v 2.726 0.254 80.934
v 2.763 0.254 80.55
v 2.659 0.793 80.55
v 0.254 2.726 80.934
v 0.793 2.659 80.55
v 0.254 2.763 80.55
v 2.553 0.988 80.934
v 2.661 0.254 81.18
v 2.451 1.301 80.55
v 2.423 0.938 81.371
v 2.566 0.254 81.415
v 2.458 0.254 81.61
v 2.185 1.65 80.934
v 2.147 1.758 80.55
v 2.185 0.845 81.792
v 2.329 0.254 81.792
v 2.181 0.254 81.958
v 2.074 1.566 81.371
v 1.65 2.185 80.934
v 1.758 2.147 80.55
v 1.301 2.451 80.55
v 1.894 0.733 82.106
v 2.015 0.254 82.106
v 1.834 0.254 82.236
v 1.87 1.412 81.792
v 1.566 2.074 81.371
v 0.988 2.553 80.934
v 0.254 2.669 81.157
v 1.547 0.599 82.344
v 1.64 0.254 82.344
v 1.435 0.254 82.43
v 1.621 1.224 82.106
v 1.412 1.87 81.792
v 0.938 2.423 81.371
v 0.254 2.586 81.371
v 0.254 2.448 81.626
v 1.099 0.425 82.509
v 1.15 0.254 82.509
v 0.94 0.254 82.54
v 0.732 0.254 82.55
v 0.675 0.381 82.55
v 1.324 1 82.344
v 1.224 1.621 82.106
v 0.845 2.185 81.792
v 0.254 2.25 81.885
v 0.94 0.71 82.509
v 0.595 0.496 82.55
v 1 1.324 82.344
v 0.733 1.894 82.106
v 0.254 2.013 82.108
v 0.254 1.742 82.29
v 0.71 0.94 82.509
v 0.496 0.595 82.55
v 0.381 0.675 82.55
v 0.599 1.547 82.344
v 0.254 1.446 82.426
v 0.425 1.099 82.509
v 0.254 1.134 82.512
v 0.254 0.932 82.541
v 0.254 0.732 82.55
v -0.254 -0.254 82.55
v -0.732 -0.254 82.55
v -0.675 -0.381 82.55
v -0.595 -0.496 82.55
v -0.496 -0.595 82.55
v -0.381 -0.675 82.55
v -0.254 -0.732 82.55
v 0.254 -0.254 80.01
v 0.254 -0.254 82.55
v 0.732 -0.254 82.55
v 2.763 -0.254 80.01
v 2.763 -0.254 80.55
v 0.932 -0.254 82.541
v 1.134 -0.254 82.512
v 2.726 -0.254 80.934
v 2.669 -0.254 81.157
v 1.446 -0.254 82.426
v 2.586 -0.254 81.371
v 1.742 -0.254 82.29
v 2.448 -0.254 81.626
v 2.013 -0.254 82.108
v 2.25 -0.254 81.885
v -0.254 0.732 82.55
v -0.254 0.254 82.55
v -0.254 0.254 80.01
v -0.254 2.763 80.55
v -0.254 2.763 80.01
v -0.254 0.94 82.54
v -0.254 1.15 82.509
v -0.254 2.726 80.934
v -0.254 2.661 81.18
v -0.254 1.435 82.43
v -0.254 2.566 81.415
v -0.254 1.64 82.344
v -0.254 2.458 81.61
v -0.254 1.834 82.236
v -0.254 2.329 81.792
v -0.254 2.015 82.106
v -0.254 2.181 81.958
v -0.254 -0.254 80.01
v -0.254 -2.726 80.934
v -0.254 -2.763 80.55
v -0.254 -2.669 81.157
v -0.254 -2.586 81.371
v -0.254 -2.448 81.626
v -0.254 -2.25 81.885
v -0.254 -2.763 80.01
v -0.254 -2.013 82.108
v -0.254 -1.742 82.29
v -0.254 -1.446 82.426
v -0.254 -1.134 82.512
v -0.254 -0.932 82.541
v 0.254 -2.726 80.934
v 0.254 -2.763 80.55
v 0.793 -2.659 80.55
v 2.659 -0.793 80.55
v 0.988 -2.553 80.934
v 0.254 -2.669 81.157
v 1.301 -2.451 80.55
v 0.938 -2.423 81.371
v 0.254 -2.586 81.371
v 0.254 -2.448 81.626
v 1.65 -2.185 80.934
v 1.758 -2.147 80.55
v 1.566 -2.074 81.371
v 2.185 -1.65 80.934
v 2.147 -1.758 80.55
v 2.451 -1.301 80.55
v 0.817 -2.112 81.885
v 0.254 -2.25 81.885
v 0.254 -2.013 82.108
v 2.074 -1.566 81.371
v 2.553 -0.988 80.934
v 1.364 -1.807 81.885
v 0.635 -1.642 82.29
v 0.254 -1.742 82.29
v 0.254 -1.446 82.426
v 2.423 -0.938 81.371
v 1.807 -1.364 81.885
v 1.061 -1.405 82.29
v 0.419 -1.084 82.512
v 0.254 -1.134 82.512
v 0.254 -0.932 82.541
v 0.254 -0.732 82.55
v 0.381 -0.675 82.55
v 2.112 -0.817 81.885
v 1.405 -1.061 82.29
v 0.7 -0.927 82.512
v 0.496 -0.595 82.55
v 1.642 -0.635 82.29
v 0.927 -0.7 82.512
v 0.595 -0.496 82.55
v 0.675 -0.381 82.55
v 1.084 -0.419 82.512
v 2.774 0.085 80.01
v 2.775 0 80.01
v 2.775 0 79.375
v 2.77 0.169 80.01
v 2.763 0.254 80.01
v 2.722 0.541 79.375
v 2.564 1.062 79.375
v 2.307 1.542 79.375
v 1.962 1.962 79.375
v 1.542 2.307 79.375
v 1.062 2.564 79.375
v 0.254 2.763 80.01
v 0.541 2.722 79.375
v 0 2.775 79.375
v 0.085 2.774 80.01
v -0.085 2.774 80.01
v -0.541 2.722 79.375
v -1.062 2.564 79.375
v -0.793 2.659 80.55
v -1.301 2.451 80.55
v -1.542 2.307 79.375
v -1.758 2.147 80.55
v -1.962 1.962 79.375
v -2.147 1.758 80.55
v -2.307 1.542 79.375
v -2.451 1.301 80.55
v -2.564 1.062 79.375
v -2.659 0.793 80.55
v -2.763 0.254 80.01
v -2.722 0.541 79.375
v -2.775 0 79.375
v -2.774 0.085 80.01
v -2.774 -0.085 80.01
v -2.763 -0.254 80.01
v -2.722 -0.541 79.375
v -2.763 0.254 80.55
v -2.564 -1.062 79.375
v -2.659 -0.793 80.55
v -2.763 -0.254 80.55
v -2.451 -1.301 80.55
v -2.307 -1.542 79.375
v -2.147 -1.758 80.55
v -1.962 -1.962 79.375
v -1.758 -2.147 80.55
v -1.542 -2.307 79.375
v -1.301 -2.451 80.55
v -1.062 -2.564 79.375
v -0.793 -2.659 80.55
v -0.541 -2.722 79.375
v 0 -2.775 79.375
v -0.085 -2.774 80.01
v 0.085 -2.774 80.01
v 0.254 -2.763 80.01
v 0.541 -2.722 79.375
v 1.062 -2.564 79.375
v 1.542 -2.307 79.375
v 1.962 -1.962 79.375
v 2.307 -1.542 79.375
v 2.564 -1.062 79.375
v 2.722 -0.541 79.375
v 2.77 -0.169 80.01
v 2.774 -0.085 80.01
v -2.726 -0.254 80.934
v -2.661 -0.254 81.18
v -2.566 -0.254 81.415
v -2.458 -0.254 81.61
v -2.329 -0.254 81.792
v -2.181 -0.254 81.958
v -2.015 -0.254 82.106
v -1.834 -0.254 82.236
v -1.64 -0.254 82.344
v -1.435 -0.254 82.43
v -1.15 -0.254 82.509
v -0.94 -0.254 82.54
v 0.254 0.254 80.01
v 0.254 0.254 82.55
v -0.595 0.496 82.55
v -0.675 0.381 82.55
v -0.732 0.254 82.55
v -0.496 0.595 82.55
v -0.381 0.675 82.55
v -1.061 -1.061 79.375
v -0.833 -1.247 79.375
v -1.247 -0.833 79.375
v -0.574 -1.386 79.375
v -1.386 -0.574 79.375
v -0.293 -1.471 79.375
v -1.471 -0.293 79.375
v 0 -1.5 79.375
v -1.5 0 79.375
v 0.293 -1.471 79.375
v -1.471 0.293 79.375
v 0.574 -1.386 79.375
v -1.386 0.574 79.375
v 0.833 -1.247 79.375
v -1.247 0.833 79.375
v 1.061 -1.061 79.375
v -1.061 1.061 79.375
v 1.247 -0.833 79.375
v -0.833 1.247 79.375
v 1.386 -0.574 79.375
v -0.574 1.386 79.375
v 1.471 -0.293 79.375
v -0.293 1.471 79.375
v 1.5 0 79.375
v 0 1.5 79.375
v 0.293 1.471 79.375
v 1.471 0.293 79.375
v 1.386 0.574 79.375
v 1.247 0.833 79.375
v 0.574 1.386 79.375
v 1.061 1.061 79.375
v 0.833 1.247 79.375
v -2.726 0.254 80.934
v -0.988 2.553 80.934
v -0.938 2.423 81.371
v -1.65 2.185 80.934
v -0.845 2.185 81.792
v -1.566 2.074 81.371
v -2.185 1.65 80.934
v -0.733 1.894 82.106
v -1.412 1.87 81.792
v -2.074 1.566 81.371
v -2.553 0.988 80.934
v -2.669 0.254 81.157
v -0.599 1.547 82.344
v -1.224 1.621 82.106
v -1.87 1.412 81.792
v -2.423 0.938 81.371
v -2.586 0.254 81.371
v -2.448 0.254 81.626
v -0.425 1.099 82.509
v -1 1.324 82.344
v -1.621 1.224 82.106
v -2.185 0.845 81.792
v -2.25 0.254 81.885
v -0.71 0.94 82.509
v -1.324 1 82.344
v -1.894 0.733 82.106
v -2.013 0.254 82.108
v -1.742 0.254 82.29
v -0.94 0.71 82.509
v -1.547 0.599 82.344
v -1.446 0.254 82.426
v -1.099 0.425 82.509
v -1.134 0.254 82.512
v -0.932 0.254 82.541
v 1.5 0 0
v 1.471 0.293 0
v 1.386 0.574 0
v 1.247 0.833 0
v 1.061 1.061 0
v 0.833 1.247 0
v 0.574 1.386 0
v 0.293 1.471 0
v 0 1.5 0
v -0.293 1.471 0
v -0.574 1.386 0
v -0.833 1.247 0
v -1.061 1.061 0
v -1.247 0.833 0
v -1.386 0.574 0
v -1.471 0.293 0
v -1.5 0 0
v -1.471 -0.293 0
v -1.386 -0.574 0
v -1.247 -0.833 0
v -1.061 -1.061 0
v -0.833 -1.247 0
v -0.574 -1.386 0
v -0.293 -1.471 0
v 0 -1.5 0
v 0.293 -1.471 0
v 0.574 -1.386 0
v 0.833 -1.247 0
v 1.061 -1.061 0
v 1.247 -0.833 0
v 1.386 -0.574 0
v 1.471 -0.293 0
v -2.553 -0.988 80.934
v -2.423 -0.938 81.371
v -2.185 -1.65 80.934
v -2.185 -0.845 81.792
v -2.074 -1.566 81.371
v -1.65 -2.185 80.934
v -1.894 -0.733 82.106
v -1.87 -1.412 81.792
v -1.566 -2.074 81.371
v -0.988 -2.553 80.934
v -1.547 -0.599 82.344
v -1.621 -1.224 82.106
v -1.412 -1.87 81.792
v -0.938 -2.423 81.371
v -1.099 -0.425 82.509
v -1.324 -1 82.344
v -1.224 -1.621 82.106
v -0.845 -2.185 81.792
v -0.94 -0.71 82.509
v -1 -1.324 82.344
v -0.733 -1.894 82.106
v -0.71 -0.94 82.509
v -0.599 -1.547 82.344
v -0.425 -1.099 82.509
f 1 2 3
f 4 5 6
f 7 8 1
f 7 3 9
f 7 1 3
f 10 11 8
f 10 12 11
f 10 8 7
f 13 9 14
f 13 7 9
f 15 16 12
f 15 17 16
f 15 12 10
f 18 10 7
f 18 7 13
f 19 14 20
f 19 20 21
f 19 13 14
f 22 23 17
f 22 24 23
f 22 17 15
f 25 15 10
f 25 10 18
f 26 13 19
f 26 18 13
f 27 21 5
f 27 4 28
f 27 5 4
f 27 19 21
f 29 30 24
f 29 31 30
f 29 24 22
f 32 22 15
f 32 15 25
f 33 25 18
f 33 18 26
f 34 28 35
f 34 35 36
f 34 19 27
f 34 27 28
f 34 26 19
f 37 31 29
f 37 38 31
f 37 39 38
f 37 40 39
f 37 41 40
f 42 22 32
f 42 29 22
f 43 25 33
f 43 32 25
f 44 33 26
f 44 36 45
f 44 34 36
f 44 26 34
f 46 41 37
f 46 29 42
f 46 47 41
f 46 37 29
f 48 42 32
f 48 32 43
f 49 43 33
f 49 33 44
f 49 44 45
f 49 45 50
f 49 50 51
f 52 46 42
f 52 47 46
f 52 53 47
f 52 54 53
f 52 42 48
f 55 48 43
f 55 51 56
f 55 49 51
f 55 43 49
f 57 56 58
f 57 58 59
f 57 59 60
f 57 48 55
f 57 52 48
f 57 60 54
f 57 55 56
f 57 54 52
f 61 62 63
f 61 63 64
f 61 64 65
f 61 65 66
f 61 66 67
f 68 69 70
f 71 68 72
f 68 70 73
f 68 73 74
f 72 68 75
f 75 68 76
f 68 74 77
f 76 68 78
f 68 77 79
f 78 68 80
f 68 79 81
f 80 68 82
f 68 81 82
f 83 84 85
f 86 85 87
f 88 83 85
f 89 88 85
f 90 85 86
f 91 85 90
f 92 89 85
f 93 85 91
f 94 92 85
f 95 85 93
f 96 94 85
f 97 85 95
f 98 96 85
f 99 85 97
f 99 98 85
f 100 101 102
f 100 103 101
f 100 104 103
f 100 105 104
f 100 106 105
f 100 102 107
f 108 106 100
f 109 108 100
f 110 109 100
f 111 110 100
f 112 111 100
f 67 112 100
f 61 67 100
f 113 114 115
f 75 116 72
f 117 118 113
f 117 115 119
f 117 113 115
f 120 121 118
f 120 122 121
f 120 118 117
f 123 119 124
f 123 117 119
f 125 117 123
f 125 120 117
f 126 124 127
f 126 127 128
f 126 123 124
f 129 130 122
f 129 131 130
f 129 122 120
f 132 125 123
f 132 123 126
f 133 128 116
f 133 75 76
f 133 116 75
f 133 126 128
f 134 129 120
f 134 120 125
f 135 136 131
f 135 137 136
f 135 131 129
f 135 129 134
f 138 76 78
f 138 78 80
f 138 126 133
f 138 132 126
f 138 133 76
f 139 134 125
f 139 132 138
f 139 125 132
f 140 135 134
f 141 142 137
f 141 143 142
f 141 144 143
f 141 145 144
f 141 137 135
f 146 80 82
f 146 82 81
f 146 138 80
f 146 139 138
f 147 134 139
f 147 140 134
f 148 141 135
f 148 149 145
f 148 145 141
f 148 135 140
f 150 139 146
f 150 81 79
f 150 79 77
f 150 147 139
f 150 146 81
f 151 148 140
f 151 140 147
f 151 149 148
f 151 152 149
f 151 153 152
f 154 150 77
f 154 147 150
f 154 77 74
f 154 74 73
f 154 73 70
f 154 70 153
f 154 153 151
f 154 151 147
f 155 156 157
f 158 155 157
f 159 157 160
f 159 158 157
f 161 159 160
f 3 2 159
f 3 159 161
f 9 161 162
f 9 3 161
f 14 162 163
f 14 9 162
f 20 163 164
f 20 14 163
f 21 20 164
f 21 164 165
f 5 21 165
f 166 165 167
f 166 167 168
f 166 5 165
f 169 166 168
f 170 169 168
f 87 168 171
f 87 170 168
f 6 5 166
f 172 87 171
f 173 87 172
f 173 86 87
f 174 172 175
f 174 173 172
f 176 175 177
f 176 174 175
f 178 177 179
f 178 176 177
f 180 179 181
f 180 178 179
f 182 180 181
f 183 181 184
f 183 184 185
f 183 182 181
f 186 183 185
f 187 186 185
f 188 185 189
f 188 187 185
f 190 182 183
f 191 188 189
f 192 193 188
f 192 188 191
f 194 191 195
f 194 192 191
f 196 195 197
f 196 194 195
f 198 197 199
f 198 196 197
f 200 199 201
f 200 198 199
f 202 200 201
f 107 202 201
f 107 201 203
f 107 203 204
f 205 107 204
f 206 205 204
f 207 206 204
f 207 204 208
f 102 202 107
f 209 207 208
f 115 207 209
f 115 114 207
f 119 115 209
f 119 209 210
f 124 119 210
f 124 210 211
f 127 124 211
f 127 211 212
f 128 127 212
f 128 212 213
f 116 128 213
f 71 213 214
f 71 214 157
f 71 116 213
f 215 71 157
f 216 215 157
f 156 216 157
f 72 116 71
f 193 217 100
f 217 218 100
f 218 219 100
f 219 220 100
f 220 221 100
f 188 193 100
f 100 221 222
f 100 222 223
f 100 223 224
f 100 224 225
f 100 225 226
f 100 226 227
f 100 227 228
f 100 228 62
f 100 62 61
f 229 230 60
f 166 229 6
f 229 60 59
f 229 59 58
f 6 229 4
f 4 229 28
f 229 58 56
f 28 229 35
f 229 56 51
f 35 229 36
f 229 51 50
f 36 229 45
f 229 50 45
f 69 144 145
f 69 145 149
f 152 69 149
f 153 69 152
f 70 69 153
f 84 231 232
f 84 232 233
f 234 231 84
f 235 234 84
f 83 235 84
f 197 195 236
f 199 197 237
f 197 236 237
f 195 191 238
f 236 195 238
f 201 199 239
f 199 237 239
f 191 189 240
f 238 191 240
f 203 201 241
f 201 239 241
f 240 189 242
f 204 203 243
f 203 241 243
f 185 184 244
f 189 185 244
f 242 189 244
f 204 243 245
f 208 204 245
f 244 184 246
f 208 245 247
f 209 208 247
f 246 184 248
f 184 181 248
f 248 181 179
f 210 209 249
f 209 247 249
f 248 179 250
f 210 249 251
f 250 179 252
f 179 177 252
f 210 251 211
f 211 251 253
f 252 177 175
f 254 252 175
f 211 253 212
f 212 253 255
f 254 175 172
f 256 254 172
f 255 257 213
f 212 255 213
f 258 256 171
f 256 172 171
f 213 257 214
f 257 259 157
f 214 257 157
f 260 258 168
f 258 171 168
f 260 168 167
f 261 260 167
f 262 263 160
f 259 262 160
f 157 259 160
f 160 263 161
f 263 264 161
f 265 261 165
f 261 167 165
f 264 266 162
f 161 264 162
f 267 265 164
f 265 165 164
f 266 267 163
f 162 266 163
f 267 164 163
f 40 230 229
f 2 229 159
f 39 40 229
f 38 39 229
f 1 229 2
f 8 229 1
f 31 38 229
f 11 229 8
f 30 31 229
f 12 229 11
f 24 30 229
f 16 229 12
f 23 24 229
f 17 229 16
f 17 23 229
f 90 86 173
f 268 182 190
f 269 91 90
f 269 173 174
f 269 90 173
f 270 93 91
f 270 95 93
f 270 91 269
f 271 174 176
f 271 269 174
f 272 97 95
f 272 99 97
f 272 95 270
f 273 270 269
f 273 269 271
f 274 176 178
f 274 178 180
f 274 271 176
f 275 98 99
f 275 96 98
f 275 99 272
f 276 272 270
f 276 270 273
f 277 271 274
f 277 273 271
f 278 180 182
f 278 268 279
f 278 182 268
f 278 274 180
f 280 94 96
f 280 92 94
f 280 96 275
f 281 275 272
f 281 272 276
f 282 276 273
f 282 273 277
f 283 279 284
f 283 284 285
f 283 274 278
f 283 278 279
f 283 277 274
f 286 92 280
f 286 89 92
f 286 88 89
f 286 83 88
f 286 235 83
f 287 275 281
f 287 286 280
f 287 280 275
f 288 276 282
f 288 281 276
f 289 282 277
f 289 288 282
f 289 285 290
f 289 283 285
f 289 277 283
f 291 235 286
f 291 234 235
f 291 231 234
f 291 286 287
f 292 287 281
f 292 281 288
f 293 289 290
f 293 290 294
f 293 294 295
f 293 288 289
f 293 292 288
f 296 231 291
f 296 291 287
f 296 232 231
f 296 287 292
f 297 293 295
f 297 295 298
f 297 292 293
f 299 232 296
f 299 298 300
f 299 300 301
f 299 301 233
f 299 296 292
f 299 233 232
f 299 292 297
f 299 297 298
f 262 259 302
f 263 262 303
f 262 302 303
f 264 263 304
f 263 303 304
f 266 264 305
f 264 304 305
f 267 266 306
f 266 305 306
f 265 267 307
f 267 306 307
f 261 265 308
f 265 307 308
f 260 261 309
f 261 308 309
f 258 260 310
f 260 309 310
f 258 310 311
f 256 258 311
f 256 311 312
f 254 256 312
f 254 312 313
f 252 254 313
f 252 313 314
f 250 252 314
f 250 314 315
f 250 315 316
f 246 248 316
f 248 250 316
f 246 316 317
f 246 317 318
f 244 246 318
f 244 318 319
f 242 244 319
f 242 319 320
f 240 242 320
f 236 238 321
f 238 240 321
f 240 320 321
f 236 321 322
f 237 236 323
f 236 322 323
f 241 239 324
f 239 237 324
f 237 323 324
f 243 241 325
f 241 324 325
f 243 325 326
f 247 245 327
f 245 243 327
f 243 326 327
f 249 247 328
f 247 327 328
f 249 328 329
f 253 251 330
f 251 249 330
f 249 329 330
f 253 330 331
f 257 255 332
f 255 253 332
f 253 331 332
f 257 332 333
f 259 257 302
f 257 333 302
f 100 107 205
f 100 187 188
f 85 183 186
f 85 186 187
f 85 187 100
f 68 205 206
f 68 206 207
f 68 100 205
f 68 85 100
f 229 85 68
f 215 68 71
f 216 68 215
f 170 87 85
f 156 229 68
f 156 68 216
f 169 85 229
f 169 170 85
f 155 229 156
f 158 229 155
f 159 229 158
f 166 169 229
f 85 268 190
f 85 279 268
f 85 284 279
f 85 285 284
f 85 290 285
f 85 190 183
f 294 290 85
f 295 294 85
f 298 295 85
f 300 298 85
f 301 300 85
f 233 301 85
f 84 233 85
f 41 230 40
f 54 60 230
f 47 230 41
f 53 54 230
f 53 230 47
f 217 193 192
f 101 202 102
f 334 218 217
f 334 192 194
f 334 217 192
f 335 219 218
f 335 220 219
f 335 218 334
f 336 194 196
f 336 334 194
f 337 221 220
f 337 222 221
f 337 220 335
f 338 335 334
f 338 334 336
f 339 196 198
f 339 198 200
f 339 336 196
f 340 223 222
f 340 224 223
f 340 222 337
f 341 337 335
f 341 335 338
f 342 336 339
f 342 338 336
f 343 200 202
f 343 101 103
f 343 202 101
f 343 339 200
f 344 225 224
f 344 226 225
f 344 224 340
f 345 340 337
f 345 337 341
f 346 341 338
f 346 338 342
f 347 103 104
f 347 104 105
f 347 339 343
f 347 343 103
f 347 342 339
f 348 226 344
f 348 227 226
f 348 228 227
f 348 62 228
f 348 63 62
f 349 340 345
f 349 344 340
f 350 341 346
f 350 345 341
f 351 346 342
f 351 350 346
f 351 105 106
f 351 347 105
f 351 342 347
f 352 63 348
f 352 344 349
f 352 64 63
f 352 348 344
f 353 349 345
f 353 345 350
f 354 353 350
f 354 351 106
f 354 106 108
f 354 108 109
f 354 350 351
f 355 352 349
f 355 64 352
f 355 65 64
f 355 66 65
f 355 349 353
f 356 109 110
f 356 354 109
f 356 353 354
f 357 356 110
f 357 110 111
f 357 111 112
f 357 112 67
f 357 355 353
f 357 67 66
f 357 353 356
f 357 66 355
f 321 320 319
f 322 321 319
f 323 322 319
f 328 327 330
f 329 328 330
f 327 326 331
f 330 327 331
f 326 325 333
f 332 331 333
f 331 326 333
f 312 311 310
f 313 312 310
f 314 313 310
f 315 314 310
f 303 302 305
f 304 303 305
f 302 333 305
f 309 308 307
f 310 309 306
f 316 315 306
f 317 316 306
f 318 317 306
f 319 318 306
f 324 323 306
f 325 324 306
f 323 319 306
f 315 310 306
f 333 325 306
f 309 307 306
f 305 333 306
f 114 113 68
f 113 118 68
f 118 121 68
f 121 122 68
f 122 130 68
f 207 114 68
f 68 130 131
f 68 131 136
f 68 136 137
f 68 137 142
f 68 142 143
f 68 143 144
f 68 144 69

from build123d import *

# Parameters (mm, degrees)
SKETCH1_R               = 1.5
BOSS_EXTRUDE1_DEPTH     = 82.55
SKETCH3_R               = 2.775
BOSS_EXTRUDE3_DEPTH     = 3.175
SKETCH4_W               = 0.508
SKETCH4_H               = 6.00854879
SKETCH4_W_2             = 6.00854879
SKETCH4_H_2             = 0.508
CUT_EXTRUDE_THIN1_DEPTH = 2.54
FILLET2_R               = 2


with BuildPart() as part:
    # Sketch1 → Boss-Extrude1 (new body)
    with BuildSketch(Plane.XY):
        Circle(SKETCH1_R)
    extrude(amount=BOSS_EXTRUDE1_DEPTH)

    # Sketch3 → Boss-Extrude3 (add)
    with BuildSketch(Plane.XY.offset(82.55)):
        Circle(SKETCH3_R)
    extrude(amount=-BOSS_EXTRUDE3_DEPTH)

    # Sketch4 → Cut-Extrude-Thin1 (cut)
    with BuildSketch(Plane.XY.offset(82.55)):
        Rectangle(SKETCH4_W, SKETCH4_H)
        Rectangle(SKETCH4_W_2, SKETCH4_H_2)
    extrude(amount=-CUT_EXTRUDE_THIN1_DEPTH, mode=Mode.SUBTRACT)

    # Fillet2
    fillet2_edges = [part.edges().sort_by_distance(p)[0] for p in [
        (-1.962221318, 1.962221318, 82.55),
        (-1.962221318, -1.962221318, 82.55),
        (1.962221318, -1.962221318, 82.55),
        (1.962221318, 1.962221318, 82.55),
    ]]
    fillet(fillet2_edges, radius=FILLET2_R)


solid = part.part
